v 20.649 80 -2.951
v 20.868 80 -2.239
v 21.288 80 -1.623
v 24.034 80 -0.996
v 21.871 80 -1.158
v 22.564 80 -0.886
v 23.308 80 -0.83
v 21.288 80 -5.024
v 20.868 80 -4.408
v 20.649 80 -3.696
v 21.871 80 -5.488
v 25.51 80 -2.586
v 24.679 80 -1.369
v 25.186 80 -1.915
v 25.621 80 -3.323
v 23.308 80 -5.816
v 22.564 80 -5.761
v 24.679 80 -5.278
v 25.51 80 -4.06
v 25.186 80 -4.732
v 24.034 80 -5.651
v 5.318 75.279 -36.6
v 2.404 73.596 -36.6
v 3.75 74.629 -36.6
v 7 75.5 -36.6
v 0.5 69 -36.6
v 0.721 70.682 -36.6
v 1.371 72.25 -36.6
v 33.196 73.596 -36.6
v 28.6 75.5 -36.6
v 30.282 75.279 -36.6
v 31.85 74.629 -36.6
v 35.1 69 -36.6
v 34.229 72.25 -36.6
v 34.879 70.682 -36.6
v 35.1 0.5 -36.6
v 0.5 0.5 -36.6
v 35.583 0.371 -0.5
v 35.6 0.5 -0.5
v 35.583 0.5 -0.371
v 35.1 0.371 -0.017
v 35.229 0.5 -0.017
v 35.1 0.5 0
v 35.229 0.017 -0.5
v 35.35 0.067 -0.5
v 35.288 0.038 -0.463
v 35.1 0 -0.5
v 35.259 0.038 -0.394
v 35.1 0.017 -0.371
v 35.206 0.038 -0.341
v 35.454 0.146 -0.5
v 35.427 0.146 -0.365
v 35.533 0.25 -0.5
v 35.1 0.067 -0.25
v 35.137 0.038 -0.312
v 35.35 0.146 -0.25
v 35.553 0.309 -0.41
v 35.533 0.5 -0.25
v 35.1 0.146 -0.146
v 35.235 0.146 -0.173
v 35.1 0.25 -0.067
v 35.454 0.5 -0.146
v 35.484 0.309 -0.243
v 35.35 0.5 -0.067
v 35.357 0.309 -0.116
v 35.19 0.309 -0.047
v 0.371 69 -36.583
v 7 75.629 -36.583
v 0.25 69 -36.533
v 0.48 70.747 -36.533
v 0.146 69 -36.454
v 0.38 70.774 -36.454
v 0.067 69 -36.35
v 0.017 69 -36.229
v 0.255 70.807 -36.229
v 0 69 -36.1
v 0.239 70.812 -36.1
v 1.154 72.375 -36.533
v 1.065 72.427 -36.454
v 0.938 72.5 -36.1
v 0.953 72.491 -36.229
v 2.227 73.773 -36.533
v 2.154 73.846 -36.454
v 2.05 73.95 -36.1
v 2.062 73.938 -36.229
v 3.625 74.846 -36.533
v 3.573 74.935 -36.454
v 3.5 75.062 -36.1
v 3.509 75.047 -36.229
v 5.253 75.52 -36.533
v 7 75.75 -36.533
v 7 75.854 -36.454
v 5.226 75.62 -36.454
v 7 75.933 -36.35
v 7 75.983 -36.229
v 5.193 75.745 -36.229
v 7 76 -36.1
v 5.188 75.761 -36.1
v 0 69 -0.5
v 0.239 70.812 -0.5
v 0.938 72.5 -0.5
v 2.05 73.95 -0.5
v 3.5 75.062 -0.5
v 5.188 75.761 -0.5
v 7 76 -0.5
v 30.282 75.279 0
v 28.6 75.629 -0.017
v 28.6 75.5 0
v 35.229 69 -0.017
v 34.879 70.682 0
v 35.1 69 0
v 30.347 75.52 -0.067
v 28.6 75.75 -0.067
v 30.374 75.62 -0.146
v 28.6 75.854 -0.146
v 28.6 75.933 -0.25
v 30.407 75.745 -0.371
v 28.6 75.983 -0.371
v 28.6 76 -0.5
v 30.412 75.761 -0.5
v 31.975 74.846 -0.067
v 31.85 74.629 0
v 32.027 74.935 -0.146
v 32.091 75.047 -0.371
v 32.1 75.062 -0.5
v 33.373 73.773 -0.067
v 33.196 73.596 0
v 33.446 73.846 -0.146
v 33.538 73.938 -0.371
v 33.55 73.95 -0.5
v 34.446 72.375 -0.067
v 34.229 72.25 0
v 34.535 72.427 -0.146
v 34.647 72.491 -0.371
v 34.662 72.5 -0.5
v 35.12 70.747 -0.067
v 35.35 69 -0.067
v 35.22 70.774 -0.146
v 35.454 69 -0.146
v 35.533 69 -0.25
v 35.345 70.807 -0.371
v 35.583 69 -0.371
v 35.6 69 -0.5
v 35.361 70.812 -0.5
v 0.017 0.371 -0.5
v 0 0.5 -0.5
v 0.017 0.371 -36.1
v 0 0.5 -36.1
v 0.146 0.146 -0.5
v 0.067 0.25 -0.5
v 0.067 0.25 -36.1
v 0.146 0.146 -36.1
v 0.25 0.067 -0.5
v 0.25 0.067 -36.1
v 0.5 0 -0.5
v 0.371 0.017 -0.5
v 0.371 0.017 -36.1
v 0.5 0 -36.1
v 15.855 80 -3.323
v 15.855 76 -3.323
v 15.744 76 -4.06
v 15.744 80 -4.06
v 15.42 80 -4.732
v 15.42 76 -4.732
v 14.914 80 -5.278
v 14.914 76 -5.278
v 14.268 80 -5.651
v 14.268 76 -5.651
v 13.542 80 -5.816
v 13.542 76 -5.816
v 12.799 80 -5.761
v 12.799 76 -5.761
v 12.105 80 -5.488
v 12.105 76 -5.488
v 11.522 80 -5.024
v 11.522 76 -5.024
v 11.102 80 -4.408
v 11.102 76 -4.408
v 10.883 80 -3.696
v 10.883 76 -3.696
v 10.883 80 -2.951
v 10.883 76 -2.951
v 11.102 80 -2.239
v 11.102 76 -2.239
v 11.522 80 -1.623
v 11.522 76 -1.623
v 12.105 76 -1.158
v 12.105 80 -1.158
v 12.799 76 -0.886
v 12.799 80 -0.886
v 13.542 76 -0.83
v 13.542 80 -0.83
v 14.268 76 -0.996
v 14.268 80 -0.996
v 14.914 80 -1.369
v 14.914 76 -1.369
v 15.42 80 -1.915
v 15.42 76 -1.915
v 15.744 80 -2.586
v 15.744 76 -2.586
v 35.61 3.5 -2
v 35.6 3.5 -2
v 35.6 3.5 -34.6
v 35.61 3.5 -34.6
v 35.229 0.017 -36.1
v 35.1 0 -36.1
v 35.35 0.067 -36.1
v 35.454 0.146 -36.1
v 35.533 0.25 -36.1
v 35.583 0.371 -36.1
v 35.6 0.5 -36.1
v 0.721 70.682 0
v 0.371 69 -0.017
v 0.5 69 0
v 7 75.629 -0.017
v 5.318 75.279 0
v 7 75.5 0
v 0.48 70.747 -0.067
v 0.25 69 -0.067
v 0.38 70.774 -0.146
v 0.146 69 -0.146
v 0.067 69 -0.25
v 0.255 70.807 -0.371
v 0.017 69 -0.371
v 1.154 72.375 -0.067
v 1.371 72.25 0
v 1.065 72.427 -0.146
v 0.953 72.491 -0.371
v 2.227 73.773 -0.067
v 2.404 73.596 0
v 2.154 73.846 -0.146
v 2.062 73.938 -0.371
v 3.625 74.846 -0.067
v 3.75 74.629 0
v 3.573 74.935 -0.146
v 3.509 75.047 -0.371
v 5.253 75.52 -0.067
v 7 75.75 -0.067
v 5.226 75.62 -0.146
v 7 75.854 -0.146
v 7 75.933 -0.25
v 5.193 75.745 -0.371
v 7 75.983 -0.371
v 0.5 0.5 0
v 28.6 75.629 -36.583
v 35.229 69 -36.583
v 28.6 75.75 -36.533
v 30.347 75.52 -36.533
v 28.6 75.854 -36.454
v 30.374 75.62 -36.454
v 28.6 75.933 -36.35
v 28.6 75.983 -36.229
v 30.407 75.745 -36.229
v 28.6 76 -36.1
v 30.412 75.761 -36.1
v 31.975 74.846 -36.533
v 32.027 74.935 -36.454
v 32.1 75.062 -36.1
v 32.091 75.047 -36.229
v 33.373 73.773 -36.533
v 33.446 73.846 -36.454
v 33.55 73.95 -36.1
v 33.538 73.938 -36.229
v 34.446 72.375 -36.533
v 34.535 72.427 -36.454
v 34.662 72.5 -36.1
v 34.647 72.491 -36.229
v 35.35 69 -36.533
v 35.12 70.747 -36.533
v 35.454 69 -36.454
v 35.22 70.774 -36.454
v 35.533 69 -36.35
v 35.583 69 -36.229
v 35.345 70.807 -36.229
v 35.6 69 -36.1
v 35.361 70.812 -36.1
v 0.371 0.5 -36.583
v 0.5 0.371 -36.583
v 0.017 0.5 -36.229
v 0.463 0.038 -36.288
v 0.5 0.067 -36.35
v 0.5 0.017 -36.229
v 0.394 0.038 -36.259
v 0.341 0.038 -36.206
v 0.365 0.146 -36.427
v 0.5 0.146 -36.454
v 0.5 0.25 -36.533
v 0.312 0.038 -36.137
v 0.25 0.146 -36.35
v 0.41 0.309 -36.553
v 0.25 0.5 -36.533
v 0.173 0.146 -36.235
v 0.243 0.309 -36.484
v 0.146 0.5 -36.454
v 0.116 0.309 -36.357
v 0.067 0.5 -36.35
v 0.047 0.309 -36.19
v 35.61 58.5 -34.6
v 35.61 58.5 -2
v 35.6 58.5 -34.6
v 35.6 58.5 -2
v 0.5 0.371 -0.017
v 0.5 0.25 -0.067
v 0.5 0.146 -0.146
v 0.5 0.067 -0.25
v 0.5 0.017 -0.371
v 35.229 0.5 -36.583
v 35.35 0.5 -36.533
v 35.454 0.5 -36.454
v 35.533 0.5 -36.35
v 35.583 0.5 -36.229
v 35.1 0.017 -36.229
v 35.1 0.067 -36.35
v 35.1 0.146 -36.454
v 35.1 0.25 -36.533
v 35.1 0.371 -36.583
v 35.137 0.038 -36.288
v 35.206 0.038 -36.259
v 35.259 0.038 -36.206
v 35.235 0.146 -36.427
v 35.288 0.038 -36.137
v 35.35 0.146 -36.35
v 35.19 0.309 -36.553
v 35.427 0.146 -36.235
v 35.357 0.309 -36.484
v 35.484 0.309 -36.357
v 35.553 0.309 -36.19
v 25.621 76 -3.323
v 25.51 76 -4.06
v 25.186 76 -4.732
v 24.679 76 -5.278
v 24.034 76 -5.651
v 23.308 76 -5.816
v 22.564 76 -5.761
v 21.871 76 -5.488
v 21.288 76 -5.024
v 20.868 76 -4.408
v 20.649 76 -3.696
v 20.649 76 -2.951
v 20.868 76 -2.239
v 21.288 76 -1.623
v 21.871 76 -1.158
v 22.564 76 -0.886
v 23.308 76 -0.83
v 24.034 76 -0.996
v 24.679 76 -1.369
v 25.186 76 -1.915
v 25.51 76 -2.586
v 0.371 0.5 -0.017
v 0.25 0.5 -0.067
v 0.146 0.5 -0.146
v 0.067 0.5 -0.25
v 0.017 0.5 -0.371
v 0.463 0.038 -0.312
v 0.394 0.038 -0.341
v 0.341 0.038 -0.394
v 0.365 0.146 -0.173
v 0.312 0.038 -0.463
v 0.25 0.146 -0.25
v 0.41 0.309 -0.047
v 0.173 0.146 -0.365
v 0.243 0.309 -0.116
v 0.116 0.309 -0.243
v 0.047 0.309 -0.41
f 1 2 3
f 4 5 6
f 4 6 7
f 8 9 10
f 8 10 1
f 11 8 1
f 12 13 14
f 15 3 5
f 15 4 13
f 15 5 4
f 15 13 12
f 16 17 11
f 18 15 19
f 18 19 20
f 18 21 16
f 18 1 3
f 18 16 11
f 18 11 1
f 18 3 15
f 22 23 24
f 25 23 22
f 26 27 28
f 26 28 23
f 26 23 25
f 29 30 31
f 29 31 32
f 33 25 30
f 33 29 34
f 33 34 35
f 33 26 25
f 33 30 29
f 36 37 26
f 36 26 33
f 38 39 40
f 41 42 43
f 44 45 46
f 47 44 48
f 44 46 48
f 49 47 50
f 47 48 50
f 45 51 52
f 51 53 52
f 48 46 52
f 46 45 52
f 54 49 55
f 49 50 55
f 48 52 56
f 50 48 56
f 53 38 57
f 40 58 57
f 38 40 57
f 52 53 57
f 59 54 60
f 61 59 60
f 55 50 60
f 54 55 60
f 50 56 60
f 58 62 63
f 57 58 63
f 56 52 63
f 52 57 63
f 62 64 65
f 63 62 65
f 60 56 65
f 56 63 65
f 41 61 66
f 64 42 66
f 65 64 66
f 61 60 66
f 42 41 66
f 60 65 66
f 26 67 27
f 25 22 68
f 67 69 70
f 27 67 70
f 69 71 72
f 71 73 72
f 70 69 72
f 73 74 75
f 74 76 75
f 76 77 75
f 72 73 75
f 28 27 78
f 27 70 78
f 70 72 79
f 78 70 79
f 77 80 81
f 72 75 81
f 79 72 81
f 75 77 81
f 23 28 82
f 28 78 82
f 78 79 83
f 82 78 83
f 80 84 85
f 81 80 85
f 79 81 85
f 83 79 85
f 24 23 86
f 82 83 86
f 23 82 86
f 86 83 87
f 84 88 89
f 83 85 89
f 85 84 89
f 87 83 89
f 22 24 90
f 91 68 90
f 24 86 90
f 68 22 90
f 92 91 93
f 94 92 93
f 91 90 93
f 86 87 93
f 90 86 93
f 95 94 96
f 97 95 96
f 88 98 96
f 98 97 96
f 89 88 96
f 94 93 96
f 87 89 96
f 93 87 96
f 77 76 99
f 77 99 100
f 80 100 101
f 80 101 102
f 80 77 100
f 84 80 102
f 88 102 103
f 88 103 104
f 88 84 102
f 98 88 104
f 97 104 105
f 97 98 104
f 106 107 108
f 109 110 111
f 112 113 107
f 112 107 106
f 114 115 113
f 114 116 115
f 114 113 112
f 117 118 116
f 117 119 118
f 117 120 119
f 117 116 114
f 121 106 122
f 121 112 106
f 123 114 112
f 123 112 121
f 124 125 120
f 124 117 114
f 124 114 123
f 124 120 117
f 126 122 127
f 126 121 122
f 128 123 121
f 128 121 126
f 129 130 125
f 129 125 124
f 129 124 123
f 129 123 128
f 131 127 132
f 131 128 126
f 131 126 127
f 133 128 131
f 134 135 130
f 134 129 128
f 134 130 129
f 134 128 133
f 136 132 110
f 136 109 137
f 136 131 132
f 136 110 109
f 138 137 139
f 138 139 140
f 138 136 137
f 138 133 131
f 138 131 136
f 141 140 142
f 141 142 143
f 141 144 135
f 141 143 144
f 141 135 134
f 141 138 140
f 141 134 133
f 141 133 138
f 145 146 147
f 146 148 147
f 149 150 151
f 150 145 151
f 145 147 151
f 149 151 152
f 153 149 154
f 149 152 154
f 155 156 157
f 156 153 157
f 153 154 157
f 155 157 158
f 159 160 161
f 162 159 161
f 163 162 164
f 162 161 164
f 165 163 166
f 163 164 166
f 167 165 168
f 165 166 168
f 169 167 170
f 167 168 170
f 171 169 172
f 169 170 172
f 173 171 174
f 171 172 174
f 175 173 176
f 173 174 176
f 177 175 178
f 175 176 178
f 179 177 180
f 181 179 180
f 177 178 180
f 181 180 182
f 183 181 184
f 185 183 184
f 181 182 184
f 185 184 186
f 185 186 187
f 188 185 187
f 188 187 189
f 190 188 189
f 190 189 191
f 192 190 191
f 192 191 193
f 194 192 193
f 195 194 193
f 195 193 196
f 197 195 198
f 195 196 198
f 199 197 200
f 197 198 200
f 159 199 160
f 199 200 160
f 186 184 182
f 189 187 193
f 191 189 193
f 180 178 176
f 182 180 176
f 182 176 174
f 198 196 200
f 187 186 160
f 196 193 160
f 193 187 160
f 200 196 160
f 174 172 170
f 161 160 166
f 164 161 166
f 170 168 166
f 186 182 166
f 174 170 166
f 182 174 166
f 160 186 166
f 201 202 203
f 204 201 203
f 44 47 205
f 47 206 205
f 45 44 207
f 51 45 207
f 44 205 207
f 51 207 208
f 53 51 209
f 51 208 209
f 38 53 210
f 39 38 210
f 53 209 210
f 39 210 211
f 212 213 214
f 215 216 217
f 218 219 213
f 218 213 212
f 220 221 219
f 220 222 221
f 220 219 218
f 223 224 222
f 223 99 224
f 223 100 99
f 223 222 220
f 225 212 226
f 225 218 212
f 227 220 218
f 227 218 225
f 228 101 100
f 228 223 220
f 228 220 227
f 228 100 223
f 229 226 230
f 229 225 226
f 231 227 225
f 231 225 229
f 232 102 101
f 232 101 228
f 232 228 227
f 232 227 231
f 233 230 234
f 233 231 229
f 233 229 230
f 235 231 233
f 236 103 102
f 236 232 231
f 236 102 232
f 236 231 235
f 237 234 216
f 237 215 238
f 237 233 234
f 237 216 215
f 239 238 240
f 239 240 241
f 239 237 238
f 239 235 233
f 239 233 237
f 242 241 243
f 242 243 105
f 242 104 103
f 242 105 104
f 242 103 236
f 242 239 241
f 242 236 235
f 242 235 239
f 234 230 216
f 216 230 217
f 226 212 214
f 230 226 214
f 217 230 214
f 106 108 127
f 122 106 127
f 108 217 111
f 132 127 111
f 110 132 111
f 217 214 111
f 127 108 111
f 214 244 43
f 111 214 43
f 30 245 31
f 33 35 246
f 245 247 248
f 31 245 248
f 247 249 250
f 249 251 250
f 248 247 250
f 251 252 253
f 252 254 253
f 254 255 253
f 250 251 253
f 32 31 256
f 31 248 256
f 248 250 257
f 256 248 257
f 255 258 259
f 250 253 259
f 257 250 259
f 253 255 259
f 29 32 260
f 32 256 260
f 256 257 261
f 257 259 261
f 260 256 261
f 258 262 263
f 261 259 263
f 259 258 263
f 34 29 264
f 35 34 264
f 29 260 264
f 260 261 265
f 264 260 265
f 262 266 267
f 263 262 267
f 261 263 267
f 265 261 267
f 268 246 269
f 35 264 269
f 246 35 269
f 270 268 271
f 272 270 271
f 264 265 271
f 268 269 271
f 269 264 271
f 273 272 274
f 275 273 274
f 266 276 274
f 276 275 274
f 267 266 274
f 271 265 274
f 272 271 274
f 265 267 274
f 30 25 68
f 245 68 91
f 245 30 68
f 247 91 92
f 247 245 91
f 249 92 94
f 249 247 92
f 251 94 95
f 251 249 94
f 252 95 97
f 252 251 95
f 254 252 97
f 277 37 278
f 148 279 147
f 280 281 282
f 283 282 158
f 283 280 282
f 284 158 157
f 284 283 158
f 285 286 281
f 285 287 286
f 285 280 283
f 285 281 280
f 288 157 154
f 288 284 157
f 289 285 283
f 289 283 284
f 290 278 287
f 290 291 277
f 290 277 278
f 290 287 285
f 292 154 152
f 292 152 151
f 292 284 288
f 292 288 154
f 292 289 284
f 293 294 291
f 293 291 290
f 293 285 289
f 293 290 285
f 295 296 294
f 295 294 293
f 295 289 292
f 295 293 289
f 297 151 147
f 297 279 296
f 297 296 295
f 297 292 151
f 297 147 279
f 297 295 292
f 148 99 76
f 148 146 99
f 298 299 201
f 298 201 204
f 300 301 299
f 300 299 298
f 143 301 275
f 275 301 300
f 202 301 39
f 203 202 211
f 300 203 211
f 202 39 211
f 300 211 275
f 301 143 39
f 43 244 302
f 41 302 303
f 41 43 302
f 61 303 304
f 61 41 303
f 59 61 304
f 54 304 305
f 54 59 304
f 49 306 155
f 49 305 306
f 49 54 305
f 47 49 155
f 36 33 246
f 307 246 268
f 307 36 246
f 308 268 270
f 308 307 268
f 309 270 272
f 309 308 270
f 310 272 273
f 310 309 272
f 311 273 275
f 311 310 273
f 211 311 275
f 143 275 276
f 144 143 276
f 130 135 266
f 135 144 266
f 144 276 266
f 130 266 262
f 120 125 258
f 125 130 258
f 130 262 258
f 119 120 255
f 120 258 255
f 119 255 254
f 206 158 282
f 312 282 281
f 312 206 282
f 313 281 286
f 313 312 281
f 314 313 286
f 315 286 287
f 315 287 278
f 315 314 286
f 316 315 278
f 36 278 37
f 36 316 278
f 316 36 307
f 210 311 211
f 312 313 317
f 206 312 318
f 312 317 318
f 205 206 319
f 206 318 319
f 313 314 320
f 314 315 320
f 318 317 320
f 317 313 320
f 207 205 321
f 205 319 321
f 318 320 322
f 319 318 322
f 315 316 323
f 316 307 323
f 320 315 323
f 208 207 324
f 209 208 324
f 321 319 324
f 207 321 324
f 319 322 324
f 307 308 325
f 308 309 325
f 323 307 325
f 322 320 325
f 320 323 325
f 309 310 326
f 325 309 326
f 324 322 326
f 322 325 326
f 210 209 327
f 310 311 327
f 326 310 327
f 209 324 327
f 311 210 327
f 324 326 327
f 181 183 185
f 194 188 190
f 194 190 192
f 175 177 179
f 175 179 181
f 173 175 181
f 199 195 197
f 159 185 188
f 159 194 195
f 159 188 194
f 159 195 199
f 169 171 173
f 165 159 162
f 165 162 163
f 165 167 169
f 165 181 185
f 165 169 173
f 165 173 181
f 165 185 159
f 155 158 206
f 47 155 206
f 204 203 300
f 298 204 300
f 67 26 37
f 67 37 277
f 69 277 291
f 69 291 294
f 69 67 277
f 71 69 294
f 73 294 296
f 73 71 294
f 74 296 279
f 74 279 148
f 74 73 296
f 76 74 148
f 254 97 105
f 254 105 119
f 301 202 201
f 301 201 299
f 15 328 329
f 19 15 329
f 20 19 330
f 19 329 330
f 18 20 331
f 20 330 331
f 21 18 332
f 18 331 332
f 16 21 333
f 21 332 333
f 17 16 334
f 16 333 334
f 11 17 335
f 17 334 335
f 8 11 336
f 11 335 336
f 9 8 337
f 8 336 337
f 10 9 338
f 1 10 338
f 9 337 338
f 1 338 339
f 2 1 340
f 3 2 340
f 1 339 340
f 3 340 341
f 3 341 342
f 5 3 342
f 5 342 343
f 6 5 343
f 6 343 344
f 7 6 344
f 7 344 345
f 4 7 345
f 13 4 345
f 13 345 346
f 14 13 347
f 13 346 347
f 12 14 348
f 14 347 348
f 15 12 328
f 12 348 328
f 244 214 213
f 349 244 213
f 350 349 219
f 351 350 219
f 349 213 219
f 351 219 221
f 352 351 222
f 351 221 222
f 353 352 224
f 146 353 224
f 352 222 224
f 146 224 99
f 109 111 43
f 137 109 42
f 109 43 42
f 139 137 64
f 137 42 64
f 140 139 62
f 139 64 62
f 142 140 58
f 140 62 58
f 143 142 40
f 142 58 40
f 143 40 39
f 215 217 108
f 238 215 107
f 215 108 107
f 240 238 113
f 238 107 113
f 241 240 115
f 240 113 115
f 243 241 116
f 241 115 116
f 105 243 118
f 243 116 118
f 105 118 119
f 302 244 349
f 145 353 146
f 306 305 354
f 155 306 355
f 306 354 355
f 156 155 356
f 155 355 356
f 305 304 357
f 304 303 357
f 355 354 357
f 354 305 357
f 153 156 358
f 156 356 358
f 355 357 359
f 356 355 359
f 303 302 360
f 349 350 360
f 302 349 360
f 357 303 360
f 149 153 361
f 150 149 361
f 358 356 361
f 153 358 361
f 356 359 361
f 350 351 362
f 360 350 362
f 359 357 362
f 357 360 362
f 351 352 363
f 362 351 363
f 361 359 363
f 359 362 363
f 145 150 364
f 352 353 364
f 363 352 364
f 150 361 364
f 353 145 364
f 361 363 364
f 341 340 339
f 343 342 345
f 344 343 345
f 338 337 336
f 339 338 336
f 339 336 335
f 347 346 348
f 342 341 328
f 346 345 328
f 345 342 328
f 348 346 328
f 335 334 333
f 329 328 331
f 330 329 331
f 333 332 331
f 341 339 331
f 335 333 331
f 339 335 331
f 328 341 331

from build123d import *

# Parameters (mm, degrees)
SKETCH1_W             = 35.6
SKETCH1_H             = 36.6
BOSS_EXTRUDE1_DEPTH   = 76
SKETCH2_R             = 2.5
BOSS_EXTRUDE2_DEPTH   = 4
BOSS_EXTRUDE2_2_DEPTH = 4
FILLET1_R             = 7
FILLET2_R             = 0.5
SKETCH3_W             = 32.6
SKETCH3_H             = 55
BOSS_EXTRUDE3_DEPTH   = 0.01


with BuildPart() as part:
    # Sketch1 → Boss-Extrude1 (new body)
    with BuildSketch(Plane(origin=(0, 0, 0), x_dir=(1, 0, 0), z_dir=(0, 1, 0))):
        with Locations((17.8, 18.3)):
            Rectangle(SKETCH1_W, SKETCH1_H)
    extrude(amount=BOSS_EXTRUDE1_DEPTH)

    # Fillet1
    fillet1_edges = [part.edges().sort_by_distance(p)[0] for p in [
        (35.6, 76, -18.3),
        (0, 76, -18.3),
    ]]
    fillet(fillet1_edges, radius=FILLET1_R)

    # Fillet2
    fillet2_edges = [part.edges().sort_by_distance(p)[0] for p in [
        (17.8, 76, 0),
        (17.8, 76, -36.6),
        (35.6, 34.5, 0),
        (0, 34.5, 0),
        (33.549747468, 73.949747468, 0),
        (2.050252532, 73.949747468, 0),
        (0, 34.5, -36.6),
        (35.6, 34.5, -36.6),
        (33.549747468, 73.949747468, -36.6),
        (2.050252532, 73.949747468, -36.6),
        (17.8, 0, -36.6),
        (35.6, 0, -18.3),
        (17.8, 0, 0),
        (0, 0, -18.3),
    ]]
    fillet(fillet2_edges, radius=FILLET2_R)

    # Sketch3 → Boss-Extrude3 (add)
    with BuildSketch(Plane(origin=(35.6, 0, 0), x_dir=(0, 0, -1), z_dir=(1, 0, 0))):
        with Locations((18.3, 31)):
            Rectangle(SKETCH3_W, SKETCH3_H)
    extrude(amount=BOSS_EXTRUDE3_DEPTH)


with BuildPart() as body_2:
    # Sketch2 → Boss-Extrude2 (new body)
    with BuildSketch(Plane(origin=(0, 76, 0), x_dir=(1, 0, 0), z_dir=(0, 1, 0))):
        with Locations((13.354835188, 3.323329695)):
            Circle(SKETCH2_R)
    extrude(amount=BOSS_EXTRUDE2_DEPTH)


with BuildPart() as body_3:
    # Sketch2 → Boss-Extrude2 2 (new body)
    with BuildSketch(Plane(origin=(0, 76, 0), x_dir=(1, 0, 0), z_dir=(0, 1, 0))):
        with Locations((23.120727578, 3.323329695)):
            Circle(SKETCH2_R)
    extrude(amount=BOSS_EXTRUDE2_2_DEPTH)


solid = Compound([part.part, body_2.part, body_3.part])
